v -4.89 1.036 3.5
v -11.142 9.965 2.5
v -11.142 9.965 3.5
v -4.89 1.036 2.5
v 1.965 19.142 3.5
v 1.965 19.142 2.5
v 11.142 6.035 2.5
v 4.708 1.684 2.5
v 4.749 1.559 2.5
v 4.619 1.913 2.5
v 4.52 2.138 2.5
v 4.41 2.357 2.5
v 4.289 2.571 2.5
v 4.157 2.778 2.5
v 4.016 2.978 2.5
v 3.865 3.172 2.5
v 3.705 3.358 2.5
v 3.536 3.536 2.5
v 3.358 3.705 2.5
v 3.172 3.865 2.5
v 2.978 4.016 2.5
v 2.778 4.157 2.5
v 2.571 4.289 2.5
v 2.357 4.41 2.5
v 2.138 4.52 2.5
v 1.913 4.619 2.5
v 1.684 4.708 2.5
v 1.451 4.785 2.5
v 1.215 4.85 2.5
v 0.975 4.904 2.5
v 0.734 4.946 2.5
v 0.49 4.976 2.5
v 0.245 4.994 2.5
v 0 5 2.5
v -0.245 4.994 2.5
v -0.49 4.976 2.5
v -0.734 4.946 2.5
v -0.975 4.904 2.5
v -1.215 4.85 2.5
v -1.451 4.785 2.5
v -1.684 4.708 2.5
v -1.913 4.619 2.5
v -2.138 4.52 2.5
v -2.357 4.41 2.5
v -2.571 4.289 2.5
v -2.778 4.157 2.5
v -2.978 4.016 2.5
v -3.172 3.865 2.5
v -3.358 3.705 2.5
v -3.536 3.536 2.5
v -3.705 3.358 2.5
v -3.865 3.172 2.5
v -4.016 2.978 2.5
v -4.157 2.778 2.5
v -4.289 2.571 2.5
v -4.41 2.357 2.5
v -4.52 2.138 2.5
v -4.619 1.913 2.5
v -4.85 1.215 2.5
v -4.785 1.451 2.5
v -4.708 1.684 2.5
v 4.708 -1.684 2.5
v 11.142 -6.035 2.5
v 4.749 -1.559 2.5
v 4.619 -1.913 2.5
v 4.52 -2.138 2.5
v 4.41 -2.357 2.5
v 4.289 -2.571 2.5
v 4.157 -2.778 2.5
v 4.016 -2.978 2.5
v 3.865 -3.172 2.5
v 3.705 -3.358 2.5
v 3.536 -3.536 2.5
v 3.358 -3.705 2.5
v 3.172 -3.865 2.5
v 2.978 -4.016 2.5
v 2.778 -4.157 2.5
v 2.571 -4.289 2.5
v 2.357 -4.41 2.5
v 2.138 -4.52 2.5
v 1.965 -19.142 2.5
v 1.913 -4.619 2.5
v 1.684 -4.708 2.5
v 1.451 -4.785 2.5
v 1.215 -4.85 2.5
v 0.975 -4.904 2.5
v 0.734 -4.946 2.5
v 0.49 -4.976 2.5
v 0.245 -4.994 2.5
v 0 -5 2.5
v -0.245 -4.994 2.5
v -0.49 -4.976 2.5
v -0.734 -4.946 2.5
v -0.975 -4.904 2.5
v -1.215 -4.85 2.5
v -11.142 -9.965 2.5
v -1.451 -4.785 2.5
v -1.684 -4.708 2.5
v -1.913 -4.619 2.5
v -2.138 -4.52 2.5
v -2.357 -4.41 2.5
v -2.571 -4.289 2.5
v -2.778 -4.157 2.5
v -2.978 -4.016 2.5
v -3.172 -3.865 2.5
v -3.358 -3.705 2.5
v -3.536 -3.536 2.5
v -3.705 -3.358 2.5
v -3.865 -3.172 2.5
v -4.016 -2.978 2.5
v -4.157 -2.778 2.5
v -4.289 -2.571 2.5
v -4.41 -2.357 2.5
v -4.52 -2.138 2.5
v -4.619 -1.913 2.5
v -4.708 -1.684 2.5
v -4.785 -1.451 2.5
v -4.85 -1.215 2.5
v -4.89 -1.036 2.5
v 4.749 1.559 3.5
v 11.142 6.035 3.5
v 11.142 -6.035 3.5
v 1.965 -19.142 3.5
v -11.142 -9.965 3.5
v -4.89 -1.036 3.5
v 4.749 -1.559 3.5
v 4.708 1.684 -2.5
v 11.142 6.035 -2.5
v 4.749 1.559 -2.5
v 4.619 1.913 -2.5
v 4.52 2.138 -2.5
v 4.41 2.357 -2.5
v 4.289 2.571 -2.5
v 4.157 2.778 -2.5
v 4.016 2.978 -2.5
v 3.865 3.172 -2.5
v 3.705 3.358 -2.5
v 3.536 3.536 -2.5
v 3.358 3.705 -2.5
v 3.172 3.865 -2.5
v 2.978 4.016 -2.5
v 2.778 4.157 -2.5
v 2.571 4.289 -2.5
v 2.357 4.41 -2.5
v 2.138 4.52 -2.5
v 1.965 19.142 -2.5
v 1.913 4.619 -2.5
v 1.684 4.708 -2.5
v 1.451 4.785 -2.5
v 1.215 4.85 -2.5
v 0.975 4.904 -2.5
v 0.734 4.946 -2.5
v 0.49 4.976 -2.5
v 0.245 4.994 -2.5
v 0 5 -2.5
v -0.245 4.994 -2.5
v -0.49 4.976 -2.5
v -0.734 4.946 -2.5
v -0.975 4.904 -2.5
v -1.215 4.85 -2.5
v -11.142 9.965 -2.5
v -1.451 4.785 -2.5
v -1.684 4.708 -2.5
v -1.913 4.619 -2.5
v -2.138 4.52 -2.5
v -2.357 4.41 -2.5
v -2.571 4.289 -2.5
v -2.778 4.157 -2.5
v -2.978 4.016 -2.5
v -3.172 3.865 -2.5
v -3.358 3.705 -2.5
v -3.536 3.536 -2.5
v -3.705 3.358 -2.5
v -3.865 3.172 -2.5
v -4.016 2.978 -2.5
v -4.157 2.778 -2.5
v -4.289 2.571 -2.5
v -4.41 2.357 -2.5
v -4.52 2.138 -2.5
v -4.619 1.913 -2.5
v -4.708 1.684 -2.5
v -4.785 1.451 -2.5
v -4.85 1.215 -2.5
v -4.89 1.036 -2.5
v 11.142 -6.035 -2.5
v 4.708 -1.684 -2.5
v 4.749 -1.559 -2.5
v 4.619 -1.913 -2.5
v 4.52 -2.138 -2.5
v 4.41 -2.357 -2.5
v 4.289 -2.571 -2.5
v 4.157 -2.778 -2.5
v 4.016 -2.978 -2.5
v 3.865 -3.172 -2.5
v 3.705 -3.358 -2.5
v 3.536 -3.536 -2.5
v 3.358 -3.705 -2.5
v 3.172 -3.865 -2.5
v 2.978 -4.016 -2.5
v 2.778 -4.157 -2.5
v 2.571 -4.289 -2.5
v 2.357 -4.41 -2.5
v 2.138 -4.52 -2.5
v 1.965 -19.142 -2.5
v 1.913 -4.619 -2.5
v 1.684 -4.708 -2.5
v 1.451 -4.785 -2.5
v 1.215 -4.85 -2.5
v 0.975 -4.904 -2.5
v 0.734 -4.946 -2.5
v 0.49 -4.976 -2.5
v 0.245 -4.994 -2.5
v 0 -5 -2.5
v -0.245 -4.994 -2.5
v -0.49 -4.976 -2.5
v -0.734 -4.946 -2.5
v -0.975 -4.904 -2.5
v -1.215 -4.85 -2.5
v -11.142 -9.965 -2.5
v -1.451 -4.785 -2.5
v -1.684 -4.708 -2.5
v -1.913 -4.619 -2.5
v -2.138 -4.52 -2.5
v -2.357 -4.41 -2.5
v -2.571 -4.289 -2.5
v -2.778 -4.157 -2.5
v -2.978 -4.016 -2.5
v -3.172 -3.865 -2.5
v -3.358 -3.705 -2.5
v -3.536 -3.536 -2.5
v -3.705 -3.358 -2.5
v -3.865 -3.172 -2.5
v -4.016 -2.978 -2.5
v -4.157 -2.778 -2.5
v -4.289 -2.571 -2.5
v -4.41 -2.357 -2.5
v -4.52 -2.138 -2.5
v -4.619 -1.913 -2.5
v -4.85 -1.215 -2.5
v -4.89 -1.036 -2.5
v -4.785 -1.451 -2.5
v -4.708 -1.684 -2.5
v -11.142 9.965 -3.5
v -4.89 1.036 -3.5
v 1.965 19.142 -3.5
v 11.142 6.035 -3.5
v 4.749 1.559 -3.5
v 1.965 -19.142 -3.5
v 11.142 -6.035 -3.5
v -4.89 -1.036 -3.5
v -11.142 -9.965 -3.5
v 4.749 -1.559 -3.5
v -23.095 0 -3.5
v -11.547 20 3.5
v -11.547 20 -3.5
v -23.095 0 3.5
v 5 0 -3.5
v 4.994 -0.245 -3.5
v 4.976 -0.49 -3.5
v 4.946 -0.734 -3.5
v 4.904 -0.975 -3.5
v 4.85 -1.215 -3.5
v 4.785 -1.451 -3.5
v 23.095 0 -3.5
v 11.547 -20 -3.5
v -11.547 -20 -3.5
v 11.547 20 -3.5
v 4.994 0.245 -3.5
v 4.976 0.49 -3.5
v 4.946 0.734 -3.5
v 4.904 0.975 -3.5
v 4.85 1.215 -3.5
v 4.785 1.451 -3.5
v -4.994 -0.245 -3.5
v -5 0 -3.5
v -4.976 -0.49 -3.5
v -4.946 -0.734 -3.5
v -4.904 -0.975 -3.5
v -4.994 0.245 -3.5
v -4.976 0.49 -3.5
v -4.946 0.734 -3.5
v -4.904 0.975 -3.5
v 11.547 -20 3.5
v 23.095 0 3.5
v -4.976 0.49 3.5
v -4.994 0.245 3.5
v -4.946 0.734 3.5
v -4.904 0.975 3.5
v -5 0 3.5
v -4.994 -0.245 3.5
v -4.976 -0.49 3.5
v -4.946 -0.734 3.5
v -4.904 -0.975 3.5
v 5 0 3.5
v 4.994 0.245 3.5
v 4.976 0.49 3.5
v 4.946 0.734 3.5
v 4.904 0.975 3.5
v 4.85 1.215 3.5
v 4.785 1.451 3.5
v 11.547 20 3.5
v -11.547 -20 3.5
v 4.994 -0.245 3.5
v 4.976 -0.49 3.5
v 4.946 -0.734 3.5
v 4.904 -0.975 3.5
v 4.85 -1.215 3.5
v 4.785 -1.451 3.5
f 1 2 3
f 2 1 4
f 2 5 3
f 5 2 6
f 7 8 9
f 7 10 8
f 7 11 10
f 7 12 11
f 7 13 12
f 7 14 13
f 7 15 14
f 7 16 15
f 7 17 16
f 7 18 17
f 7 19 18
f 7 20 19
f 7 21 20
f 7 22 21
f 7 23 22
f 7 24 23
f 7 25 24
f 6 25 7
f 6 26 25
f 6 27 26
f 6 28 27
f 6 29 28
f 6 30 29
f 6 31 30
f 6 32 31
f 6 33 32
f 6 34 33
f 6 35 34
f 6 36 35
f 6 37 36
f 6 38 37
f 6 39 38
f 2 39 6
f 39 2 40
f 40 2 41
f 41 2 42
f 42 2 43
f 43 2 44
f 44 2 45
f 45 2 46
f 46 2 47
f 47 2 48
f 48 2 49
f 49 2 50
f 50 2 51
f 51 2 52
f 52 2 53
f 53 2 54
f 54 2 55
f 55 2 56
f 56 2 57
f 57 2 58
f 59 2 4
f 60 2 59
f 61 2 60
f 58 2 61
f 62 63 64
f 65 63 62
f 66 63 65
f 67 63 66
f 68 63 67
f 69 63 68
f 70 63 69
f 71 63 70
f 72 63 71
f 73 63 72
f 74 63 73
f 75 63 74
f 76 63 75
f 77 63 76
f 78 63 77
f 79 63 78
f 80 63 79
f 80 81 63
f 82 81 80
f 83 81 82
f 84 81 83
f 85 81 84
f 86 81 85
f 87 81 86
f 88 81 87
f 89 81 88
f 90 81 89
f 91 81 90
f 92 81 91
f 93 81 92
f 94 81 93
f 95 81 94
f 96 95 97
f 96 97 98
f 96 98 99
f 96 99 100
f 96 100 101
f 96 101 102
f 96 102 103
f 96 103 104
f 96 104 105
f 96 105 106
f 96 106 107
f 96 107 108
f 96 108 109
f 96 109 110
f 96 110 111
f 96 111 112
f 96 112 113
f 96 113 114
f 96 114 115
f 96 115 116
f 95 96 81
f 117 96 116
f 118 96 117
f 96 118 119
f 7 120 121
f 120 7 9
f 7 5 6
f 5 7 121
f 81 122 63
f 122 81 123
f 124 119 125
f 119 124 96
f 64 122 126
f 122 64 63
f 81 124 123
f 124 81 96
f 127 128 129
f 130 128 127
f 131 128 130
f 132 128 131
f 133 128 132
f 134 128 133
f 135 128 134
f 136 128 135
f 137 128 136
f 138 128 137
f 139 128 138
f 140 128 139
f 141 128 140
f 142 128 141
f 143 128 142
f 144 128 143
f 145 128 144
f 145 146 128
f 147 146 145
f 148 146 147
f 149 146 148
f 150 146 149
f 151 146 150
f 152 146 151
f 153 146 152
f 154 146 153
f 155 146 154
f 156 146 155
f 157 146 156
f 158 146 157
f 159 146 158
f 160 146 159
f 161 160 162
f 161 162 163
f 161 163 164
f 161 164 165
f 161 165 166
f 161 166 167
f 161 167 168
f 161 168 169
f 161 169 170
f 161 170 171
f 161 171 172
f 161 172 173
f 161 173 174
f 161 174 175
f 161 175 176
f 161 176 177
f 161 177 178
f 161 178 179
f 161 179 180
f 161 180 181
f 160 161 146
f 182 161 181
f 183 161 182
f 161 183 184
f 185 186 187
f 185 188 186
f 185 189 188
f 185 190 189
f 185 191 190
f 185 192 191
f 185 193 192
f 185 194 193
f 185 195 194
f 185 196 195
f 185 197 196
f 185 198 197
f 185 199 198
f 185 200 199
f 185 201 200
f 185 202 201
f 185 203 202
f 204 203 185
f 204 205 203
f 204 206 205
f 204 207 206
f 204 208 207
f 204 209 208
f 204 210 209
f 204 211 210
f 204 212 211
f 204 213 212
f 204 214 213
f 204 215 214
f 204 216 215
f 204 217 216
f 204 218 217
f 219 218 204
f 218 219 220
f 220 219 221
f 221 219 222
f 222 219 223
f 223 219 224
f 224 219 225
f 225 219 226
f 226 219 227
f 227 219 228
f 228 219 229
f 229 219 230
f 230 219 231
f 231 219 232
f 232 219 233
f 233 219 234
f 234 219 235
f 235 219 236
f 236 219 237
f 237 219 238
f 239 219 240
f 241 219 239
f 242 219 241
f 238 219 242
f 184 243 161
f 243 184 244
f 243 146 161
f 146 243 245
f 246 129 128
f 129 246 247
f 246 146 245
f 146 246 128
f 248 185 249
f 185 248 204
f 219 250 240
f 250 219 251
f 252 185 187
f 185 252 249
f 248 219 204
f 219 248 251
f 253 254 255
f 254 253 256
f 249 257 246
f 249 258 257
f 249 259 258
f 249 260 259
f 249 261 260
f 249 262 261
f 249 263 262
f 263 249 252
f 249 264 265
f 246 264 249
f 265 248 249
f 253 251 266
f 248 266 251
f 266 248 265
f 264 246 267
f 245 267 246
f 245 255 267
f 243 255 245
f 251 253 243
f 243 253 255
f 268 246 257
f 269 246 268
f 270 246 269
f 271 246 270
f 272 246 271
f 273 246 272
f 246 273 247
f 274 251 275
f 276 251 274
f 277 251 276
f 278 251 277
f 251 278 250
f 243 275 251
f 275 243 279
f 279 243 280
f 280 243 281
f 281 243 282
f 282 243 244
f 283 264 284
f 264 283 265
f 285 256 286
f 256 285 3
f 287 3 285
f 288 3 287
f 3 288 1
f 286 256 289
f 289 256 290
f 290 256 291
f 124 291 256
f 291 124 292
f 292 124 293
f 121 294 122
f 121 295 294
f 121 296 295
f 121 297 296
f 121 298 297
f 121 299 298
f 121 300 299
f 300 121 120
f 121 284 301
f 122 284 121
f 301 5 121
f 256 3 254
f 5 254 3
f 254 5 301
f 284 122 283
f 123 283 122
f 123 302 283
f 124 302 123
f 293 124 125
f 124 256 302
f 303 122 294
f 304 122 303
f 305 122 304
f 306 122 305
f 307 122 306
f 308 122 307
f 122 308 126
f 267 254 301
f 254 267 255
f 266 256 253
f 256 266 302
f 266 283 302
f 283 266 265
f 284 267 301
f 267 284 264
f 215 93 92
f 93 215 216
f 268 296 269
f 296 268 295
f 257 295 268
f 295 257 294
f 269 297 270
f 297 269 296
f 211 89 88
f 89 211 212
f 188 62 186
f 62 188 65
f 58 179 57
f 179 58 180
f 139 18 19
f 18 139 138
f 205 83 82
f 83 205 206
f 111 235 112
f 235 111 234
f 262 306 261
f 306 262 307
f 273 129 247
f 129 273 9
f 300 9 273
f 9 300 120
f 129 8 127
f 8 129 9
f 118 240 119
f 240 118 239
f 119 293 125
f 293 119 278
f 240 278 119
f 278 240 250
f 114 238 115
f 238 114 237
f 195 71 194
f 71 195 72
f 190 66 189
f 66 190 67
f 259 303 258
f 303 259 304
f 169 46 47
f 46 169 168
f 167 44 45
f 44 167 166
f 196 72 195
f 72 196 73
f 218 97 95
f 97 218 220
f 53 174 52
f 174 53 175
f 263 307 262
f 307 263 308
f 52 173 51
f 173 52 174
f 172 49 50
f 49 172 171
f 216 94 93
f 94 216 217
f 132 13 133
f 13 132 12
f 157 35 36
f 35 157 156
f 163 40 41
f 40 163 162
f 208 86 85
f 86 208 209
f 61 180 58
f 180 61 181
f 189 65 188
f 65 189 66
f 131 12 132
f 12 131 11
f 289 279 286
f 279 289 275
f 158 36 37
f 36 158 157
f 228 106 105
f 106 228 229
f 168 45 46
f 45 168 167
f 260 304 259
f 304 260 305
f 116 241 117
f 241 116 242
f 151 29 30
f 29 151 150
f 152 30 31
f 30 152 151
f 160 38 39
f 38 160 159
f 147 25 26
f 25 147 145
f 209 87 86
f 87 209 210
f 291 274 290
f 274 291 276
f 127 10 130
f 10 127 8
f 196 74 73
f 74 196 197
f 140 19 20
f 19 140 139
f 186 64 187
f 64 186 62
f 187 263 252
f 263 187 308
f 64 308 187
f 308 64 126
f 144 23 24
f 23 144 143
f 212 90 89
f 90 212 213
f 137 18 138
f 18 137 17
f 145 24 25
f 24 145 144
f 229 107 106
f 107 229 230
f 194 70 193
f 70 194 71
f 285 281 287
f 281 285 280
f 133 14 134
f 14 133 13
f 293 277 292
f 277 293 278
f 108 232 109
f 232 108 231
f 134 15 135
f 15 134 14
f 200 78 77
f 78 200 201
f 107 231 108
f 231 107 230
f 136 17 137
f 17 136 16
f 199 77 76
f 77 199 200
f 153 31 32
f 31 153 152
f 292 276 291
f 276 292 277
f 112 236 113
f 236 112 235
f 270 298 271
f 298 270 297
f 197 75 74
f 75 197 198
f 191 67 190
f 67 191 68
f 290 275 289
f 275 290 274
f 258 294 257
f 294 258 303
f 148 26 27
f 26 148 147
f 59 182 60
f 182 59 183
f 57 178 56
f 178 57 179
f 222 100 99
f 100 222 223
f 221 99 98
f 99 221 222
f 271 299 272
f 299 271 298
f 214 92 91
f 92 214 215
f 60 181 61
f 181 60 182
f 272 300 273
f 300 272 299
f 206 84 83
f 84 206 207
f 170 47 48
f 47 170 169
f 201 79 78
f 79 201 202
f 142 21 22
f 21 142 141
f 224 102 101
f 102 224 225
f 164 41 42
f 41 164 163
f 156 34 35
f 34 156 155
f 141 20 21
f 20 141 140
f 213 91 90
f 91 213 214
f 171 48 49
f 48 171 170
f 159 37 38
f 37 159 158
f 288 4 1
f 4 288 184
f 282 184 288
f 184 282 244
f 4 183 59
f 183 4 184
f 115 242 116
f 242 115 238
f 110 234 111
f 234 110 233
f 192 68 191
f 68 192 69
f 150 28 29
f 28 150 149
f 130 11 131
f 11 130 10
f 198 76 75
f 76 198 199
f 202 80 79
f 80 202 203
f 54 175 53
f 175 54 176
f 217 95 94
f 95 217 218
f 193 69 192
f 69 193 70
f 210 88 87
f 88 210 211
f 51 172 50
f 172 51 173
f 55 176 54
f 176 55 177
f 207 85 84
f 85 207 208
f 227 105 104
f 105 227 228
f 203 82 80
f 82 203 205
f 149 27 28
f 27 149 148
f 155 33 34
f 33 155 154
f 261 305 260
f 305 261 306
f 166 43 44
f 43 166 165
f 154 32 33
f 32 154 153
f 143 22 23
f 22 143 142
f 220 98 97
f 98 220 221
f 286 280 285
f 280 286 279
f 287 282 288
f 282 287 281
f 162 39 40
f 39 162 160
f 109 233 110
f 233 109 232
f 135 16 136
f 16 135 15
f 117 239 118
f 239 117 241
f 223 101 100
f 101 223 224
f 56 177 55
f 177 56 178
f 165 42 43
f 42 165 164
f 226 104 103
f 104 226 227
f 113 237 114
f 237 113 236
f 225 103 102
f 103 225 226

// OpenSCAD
$fn = 128;

// Target bounding box (mm): 46.19 x 40.00 x 7.00
bbox_X = 46.19;                 // point-to-point
bbox_Y = 40.00;                 // flat-to-flat
thickness_Z = 7.00;

hole_d = 10.00;
hole_offset_x = 0;
hole_offset_y = 0;

// Chevron/V-groove recessed relief on two opposing LARGE faces (top & bottom)
chevron_depth   = 1.00;         // recess depth into the face (along Z)
chevron_land_w  = 2.00;         // small flat land between the two V cuts (along Y)
chevron_span_w  = 28.00;        // total span across the face (along Y)
chevron_angle_deg = 35;         // angle of each groove arm in the face plane

// Robust boolean overlap
overlap = 1.00;                 // 1-2mm as requested

// Derived
R = bbox_X/2;                   // center to point
apothem = bbox_Y/2;             // center to flat

// Regular hex in XY with flats horizontal (top/bottom)
module hex2d() {
    polygon(points=[
        [ R, 0 ],
        [ R/2,  apothem ],
        [ -R/2, apothem ],
        [ -R, 0 ],
        [ -R/2, -apothem ],
        [ R/2,  -apothem ]
    ]);
}

module hex_prism_body() {
    linear_extrude(height=thickness_Z, center=true)
        hex2d();
}

module through_hole() {
    translate([hole_offset_x, hole_offset_y, 0])
        cylinder(d=hole_d, h=thickness_Z + 2*overlap, center=true);
}

// Chevron recess cut into a large face at z = +/- thickness_Z/2.
// Implemented as two rotated "bars" in the XY plane, extruded in Z to cut downward/upward.
// This makes the chevron visible in orthographic views (as edges/lines on the face).
module chevron_recess_on_face(face_sign=+1) {
    // face_sign: +1 = top face, -1 = bottom face
    // Cutter thickness in Z: enough to fully remove chevron_depth into the face with overlap.
    cut_h = chevron_depth + 2*overlap;

    // Place cutter so it intersects the face and cuts inward by chevron_depth.
    // For top: center slightly above the top surface; for bottom: slightly below bottom surface.
    z_center = face_sign*(thickness_Z/2 - chevron_depth/2 + overlap);

    // Arm sizing in XY
    arm_len = chevron_span_w/2;
    arm_w   = (chevron_span_w/2) + chevron_land_w; // wide enough after rotation

    // Centers of the two arms in Y so they leave a land of width chevron_land_w at Y=0.
    y_center = chevron_land_w/2 + arm_len/2;

    translate([0, 0, z_center])
        union() {
            // Upper arm
            translate([0, +y_center, 0])
                rotate([0, 0, chevron_angle_deg])
                    cube([arm_w, arm_w, cut_h], center=true);

            // Lower arm
            translate([0, -y_center, 0])
                rotate([0, 0, -chevron_angle_deg])
                    cube([arm_w, arm_w, cut_h], center=true);
        }
}

difference() {
    // Single solid base
    hex_prism_body();

    // Through hole
    through_hole();

    // Chevron recessed relief on two opposing faces (top and bottom)
    chevron_recess_on_face(+1);
    chevron_recess_on_face(-1);
}
